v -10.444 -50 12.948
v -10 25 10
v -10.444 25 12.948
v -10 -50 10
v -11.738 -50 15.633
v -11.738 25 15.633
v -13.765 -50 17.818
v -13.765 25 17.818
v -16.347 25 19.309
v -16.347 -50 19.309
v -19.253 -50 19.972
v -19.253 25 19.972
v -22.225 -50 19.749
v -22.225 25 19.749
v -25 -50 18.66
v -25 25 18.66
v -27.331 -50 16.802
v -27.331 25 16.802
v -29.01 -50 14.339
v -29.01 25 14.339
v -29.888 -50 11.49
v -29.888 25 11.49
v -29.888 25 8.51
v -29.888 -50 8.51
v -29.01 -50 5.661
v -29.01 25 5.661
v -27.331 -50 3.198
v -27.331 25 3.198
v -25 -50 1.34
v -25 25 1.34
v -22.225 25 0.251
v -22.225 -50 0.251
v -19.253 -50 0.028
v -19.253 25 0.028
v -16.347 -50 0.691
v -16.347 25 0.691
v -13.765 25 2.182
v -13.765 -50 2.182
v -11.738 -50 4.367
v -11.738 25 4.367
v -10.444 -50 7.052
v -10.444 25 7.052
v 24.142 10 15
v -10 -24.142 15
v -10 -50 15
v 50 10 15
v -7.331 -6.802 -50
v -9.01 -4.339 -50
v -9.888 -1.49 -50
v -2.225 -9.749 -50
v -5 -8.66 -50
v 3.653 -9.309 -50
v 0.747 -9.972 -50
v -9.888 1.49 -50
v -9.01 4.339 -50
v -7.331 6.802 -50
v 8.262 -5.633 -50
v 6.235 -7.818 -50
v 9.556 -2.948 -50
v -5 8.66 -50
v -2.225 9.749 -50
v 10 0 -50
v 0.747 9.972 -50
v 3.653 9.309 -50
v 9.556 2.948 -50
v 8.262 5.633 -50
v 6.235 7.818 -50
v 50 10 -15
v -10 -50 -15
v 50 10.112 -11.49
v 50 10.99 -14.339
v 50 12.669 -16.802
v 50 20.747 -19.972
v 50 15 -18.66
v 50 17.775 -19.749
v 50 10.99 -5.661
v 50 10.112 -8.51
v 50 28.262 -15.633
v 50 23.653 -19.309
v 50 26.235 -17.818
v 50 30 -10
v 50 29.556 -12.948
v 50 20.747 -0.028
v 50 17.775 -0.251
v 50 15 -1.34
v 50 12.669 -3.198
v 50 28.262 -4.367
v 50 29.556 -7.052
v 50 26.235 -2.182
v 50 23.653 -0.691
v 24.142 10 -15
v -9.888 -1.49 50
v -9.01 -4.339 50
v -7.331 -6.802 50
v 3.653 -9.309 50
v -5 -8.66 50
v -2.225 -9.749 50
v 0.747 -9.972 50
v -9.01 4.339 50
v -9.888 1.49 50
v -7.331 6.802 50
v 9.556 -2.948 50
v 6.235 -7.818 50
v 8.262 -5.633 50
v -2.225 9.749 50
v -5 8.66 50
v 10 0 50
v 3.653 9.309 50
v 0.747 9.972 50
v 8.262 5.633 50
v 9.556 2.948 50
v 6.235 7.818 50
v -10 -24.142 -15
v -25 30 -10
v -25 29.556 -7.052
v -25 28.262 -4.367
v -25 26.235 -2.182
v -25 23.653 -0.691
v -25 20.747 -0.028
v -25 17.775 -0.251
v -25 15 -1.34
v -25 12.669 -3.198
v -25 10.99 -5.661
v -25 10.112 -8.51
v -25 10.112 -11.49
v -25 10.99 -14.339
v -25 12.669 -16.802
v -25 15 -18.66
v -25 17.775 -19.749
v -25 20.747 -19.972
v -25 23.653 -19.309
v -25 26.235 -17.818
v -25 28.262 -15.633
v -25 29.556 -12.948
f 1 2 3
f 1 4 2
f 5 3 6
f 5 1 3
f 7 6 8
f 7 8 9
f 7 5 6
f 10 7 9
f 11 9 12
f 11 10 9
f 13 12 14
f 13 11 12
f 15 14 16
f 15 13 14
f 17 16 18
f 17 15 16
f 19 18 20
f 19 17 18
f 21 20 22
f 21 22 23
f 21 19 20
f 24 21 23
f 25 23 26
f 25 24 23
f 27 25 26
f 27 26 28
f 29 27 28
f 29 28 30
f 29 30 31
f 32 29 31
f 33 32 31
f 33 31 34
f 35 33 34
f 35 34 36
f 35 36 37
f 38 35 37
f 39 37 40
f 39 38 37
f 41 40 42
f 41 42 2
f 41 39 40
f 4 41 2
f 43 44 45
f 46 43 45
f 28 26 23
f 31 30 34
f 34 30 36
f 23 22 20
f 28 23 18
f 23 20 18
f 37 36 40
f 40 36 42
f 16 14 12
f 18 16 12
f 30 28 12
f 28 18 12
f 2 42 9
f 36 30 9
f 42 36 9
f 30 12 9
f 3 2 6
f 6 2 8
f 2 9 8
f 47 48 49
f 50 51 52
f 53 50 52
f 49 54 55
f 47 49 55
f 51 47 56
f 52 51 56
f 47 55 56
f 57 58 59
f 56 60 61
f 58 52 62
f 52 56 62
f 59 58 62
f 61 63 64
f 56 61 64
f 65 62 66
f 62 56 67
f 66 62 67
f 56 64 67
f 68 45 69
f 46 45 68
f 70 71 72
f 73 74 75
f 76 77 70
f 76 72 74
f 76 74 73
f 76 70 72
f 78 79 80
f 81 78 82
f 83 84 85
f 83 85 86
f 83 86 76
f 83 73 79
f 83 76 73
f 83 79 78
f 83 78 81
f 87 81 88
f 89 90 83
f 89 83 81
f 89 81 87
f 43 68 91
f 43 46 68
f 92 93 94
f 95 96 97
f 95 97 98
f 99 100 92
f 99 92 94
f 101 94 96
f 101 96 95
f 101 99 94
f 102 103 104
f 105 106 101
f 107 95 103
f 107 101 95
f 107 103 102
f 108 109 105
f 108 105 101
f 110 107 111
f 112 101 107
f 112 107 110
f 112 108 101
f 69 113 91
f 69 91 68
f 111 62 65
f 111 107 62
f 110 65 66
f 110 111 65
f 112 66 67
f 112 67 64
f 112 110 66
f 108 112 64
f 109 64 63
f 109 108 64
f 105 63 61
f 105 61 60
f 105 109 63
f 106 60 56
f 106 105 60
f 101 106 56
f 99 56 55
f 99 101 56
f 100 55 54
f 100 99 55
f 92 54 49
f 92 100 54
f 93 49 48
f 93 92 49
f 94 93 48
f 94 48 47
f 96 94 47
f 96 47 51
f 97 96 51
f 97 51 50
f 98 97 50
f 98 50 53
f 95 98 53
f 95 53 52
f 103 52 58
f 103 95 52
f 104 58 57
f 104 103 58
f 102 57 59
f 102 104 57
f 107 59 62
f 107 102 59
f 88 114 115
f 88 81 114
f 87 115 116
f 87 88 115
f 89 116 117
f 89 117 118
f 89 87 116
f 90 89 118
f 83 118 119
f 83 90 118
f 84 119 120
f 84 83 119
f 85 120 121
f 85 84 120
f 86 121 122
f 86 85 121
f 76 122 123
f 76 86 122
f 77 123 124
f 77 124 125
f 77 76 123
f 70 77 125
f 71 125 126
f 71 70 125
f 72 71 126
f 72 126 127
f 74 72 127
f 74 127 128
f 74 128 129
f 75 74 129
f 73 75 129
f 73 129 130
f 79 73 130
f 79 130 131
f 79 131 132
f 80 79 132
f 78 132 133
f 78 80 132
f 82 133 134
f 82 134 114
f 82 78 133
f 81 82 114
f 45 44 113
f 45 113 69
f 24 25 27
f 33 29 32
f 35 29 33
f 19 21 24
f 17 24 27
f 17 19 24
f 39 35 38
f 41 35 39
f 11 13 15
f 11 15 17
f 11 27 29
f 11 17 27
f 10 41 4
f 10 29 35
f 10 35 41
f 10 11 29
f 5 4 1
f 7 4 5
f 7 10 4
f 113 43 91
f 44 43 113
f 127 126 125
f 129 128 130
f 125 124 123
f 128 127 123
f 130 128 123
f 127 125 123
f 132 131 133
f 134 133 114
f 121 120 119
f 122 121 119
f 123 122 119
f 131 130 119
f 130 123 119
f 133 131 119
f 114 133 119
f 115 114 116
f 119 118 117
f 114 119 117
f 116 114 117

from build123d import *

# Parameters (mm, degrees)
F0_R          = 10
F1_DEPTH      = 50
F2_R          = 10
F3_DEPTH      = 50
F3_DEPTH_BACK = 25
F4_R          = 10
F5_DEPTH      = 50
F5_DEPTH_BACK = 25
F7_DEPTH      = 15


with BuildPart() as f1:
    # F0 (on Top) → F1 (new body, symmetric)
    with BuildSketch(Plane.XY):
        Circle(F0_R)
    extrude(amount=F1_DEPTH, both=True)


with BuildPart() as f3:
    # F2 (on Front) → F3 (new body, two sides)
    with BuildSketch(Plane.XZ) as f3_sk:
        with Locations((-20, 10)):
            Circle(F2_R)
    extrude(amount=F3_DEPTH)
    extrude(f3_sk.sketch, amount=-F3_DEPTH_BACK)


with BuildPart() as f5:
    # F4 (on Right) → F5 (new body, two sides)
    with BuildSketch(Plane.YZ) as f5_sk:
        with Locations((20, -10)):
            Circle(F4_R)
    extrude(amount=F5_DEPTH)
    extrude(f5_sk.sketch, amount=-F5_DEPTH_BACK)


with BuildPart() as f7:
    # F6 (on Top) → F7 (new body, symmetric)
    with BuildSketch(Plane.XY):
        Polygon((50, 10), (24.142136, 10), (-10, -24.142136), (-10, -50), align=None)
    extrude(amount=F7_DEPTH, both=True)


solid = Compound([f1.part, f3.part, f5.part, f7.part])
